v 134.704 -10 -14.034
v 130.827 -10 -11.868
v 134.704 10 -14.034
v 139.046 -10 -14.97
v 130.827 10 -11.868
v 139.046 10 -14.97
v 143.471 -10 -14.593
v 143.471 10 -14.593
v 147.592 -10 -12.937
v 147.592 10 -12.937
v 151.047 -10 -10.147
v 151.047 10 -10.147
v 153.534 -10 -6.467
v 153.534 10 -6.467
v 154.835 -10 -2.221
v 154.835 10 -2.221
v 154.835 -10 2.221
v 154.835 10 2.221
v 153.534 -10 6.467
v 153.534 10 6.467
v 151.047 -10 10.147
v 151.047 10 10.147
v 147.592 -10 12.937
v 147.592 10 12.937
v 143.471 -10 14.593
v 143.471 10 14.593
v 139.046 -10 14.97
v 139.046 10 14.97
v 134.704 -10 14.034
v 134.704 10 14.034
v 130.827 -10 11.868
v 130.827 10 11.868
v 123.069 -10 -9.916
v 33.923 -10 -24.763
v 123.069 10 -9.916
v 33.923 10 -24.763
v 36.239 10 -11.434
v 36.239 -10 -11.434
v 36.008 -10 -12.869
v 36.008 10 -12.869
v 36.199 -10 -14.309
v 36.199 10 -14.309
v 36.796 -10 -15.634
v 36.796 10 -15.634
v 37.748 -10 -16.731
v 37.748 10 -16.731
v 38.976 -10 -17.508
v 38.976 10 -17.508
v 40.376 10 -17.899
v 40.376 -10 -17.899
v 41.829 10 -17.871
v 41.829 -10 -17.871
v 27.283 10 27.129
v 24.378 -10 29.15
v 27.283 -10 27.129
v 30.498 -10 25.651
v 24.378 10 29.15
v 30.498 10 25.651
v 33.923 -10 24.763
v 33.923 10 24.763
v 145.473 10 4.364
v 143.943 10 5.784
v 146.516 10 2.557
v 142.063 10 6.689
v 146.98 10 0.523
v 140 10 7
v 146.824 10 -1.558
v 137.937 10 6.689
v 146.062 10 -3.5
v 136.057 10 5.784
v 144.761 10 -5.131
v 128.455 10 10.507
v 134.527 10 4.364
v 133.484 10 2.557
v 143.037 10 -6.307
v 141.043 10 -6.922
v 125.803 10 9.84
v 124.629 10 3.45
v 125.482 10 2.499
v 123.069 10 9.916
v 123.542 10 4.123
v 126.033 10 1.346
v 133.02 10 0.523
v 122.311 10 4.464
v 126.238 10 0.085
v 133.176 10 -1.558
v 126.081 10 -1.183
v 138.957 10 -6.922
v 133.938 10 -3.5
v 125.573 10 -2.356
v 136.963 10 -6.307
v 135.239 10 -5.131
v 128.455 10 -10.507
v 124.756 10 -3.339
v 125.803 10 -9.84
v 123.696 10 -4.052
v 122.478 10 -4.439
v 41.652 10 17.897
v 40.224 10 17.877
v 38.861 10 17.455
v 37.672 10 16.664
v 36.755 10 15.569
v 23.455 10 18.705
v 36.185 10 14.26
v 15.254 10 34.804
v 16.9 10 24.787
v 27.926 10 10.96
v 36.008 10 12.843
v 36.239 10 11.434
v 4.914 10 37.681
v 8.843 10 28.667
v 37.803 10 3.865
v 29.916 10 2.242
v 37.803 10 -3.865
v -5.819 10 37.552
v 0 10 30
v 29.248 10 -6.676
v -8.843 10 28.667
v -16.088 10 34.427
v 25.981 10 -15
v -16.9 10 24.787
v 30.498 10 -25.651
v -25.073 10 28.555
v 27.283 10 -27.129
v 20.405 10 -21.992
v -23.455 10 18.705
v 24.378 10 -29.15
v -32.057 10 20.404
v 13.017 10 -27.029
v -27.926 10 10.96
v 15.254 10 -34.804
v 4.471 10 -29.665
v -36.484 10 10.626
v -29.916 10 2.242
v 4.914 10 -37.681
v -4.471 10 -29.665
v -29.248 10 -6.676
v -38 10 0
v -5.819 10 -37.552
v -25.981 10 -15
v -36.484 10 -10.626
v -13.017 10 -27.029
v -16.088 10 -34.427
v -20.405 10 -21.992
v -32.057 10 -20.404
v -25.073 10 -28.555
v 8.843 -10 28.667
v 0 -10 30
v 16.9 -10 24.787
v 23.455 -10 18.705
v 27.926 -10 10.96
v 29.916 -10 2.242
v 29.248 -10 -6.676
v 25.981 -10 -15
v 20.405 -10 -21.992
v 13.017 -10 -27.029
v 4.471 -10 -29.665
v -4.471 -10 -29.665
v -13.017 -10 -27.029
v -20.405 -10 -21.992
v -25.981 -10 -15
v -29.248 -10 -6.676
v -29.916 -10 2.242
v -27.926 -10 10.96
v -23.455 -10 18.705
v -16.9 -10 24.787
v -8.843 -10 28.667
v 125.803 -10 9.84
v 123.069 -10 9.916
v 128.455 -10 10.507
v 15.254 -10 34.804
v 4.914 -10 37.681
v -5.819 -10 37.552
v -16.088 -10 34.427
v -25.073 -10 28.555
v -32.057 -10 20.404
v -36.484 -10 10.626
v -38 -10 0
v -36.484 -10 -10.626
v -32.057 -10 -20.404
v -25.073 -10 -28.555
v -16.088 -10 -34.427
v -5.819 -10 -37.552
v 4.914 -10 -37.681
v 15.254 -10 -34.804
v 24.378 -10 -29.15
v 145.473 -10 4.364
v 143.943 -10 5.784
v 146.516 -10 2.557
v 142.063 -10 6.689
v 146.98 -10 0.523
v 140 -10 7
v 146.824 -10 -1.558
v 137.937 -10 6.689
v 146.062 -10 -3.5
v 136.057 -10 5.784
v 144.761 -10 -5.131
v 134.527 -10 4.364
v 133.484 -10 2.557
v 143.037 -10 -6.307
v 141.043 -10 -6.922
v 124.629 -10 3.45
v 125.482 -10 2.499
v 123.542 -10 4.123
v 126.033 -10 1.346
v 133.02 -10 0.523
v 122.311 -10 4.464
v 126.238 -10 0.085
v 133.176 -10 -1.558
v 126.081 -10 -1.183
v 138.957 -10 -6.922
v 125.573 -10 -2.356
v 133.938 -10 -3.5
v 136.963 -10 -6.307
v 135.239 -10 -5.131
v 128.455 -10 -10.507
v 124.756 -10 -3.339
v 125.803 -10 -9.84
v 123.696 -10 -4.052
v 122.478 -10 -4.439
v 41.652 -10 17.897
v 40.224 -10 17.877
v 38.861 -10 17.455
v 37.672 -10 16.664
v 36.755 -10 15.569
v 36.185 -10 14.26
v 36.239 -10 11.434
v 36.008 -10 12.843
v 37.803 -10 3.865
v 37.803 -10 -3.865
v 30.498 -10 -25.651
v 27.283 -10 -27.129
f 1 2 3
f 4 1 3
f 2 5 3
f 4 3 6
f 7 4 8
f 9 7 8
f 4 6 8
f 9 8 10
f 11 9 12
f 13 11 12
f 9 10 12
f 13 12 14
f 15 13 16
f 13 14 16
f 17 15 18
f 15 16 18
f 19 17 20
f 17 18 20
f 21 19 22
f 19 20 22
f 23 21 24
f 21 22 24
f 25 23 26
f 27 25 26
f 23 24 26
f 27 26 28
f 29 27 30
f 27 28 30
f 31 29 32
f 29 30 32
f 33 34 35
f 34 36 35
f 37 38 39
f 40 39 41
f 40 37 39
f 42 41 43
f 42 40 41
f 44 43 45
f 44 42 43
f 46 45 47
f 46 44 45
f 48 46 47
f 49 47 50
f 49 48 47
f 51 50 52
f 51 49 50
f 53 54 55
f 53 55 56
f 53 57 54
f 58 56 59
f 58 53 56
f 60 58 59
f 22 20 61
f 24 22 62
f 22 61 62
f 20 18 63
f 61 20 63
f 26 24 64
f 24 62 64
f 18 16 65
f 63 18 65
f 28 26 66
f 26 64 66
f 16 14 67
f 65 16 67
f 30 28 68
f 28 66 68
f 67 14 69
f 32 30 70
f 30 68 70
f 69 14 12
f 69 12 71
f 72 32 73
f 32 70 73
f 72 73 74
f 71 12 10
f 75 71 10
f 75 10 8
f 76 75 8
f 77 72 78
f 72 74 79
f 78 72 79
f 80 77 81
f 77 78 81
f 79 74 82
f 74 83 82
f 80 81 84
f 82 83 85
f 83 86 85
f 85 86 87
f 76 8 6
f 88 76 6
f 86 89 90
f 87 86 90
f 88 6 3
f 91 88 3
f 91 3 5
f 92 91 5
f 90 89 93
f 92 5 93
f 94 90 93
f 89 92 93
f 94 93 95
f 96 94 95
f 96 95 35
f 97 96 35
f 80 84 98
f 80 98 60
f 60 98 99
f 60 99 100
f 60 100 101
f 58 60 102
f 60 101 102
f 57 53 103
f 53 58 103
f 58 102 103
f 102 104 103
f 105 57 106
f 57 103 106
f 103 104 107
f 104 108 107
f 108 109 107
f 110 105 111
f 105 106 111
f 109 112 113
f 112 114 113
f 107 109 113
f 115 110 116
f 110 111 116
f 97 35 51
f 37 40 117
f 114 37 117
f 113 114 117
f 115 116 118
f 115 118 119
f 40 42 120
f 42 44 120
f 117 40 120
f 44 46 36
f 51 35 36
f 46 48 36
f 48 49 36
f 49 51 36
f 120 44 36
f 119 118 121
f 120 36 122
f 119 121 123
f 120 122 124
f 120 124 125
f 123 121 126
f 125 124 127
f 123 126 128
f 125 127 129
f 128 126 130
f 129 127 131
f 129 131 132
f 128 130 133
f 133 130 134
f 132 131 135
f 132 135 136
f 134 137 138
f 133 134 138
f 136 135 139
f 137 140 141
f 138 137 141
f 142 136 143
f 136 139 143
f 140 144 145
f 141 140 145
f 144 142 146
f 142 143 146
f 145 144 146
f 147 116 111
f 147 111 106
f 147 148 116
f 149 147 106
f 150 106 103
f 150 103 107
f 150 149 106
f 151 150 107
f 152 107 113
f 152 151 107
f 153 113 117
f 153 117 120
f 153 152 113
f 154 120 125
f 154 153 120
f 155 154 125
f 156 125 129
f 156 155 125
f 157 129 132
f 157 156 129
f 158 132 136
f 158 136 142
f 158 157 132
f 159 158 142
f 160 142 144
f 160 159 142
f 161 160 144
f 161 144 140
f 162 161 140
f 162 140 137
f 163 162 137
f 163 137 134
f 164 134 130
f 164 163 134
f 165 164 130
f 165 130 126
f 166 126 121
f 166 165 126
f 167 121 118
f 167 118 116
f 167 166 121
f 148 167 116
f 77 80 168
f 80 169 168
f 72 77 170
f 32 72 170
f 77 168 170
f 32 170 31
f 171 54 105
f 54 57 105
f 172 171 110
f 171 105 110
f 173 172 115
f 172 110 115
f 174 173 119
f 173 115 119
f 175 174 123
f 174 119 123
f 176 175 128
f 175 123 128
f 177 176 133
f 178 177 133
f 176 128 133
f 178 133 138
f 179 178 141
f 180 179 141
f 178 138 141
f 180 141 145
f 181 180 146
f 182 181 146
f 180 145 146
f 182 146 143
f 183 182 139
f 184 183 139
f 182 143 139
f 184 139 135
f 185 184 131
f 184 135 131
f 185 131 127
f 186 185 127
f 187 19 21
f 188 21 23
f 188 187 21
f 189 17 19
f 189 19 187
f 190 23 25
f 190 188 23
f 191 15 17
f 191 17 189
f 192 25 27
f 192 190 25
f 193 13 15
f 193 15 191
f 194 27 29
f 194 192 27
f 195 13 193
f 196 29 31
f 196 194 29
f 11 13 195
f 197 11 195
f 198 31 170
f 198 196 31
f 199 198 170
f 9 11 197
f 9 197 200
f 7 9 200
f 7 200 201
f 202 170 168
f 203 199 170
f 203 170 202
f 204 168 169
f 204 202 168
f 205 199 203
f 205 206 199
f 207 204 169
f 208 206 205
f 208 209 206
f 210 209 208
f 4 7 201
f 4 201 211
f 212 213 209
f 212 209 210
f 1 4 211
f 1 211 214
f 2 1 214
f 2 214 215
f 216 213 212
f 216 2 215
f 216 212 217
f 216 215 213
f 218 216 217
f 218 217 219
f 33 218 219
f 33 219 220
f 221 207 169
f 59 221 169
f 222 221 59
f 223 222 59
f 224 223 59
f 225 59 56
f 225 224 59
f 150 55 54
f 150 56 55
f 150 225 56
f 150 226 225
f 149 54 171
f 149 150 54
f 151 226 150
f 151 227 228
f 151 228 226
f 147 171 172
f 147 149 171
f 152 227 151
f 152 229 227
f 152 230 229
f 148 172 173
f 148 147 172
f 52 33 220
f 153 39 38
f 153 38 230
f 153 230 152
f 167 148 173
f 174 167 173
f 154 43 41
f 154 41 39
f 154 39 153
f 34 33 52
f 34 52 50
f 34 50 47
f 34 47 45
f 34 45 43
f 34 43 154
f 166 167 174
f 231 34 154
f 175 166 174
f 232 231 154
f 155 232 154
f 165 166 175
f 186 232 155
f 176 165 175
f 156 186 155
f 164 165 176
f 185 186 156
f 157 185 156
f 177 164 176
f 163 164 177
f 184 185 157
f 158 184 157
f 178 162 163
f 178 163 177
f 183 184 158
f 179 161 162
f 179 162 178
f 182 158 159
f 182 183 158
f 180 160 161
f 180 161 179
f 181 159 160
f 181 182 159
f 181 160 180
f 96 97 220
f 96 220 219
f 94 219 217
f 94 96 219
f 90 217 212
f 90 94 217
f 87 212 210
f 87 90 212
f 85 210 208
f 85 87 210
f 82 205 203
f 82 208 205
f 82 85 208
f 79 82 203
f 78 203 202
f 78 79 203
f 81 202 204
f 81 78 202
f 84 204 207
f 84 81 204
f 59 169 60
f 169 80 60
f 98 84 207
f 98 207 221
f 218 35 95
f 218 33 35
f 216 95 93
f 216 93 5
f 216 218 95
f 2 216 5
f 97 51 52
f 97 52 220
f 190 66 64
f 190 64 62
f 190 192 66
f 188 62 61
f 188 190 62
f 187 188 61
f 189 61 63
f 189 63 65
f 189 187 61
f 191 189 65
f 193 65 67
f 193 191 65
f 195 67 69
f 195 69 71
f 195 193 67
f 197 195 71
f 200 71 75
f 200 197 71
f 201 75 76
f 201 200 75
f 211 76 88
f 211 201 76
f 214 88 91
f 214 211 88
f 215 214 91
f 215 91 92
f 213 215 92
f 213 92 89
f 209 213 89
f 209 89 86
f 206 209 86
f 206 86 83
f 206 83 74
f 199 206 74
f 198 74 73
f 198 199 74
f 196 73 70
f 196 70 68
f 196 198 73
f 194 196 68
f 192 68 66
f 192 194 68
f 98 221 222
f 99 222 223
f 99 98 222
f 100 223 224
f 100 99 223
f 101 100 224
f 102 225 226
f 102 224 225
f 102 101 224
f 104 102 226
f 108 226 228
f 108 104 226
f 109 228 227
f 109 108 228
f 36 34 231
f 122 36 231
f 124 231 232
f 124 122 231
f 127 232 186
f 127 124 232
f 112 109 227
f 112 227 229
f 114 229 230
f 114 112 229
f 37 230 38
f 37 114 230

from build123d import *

# Parameters (mm, degrees)
SKETCH1_R           = 30
SKETCH1_R_2         = 7
BOSS_EXTRUDE1_DEPTH = 10
FILLET1_R           = 10
FILLET2_R           = 20
CUT_EXTRUDE1_DEPTH  = 161.838428244


with BuildPart() as part:
    # Sketch1 → Boss-Extrude1 (new, symmetric)
    with BuildSketch(Plane(origin=(0, 0, 0), x_dir=(1, 0, 0), z_dir=(0, 1, 0))):
        with BuildLine():
            Line((27.935473676, 25.760615491), (128.063755469, 9.084385863))
            ThreePointArc((128.063755469, 9.084385863), (155, 0), (128.063755469, -9.084385863))
            Line((128.063755469, -9.084385863), (27.935473676, -25.760615491))
            ThreePointArc((27.935473676, -25.760615491), (-38, 0), (27.935473676, 25.760615491))
        make_face()
        with Locations(Location((0, 0, 0), (0, 0, 270))):
            Circle(SKETCH1_R, mode=Mode.SUBTRACT)
        with Locations(Location((140, 0, 0), (0, 0, 270))):
            Circle(SKETCH1_R_2, mode=Mode.SUBTRACT)
    extrude(amount=BOSS_EXTRUDE1_DEPTH, both=True)

    # Fillet1
    fillet1_edges = [part.edges().sort_by_distance(p)[0] for p in [
        (128.063755469, 0, -9.084385863),
        (128.063755469, 0, 9.084385863),
    ]]
    fillet(fillet1_edges, radius=FILLET1_R)

    # Fillet2
    fillet2_edges = [part.edges().sort_by_distance(p)[0] for p in [
        (27.935473676, 0, -25.760615491),
        (27.935473676, 0, 25.760615491),
    ]]
    fillet(fillet2_edges, radius=FILLET2_R)

    # Sketch2 → Cut-Extrude1 (cut, through all)
    with BuildSketch(Plane(origin=(0, 10, 0), x_dir=(1, 0, 0), z_dir=(0, 1, 0))):
        with BuildLine():
            Line((41.828554558, 17.870982725), (122.478416149, 4.438857582))
            ThreePointArc((122.478416149, 4.438857582), (126.238334256, -0.084646201), (122.310930345, -4.463523817))
            Line((122.310930345, -4.463523817), (41.652034204, -17.897153652))
            ThreePointArc((41.652034204, -17.897153652), (37.174066261, -16.149472145), (36.238855523, -11.43439331))
            ThreePointArc((36.238855523, -11.43439331), (38, 0), (36.238855523, 11.43439331))
            ThreePointArc((36.238855523, 11.43439331), (37.231968897, 16.217361812), (41.828554558, 17.870982725))
        make_face()
    extrude(amount=-CUT_EXTRUDE1_DEPTH, mode=Mode.SUBTRACT)


solid = part.part
